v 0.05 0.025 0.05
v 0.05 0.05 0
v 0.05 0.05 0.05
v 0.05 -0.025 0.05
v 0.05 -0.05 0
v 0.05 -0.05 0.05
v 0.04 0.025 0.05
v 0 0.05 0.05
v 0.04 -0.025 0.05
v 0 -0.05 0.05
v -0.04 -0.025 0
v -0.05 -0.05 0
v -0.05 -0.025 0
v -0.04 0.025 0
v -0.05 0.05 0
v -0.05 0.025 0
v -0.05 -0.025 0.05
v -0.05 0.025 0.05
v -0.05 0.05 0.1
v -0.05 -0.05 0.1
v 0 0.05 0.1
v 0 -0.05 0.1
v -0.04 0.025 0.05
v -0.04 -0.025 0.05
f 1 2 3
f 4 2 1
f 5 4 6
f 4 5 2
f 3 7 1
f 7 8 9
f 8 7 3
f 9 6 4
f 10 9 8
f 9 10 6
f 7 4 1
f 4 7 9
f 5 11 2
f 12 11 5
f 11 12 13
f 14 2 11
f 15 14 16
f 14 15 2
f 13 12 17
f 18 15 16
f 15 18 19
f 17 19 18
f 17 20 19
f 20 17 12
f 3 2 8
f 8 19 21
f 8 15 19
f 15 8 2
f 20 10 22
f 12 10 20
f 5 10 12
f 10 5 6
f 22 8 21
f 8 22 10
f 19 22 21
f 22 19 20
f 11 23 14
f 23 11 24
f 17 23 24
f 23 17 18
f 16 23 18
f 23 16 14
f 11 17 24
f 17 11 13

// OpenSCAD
module stepped_block() {
    difference() {
        union() {
            translate([-0.05, -0.05, 0])
                cube([0.1, 0.1, 0.05]);
            translate([-0.05, -0.05, 0.05])
                cube([0.05, 0.1, 0.05]);
        }
        translate([-0.05, -0.025, 0])
            cube([0.01, 0.05, 0.05]);
        translate([0.04, -0.025, 0.05])
            cube([0.01, 0.05, 0.05]);
    }
}

stepped_block();
